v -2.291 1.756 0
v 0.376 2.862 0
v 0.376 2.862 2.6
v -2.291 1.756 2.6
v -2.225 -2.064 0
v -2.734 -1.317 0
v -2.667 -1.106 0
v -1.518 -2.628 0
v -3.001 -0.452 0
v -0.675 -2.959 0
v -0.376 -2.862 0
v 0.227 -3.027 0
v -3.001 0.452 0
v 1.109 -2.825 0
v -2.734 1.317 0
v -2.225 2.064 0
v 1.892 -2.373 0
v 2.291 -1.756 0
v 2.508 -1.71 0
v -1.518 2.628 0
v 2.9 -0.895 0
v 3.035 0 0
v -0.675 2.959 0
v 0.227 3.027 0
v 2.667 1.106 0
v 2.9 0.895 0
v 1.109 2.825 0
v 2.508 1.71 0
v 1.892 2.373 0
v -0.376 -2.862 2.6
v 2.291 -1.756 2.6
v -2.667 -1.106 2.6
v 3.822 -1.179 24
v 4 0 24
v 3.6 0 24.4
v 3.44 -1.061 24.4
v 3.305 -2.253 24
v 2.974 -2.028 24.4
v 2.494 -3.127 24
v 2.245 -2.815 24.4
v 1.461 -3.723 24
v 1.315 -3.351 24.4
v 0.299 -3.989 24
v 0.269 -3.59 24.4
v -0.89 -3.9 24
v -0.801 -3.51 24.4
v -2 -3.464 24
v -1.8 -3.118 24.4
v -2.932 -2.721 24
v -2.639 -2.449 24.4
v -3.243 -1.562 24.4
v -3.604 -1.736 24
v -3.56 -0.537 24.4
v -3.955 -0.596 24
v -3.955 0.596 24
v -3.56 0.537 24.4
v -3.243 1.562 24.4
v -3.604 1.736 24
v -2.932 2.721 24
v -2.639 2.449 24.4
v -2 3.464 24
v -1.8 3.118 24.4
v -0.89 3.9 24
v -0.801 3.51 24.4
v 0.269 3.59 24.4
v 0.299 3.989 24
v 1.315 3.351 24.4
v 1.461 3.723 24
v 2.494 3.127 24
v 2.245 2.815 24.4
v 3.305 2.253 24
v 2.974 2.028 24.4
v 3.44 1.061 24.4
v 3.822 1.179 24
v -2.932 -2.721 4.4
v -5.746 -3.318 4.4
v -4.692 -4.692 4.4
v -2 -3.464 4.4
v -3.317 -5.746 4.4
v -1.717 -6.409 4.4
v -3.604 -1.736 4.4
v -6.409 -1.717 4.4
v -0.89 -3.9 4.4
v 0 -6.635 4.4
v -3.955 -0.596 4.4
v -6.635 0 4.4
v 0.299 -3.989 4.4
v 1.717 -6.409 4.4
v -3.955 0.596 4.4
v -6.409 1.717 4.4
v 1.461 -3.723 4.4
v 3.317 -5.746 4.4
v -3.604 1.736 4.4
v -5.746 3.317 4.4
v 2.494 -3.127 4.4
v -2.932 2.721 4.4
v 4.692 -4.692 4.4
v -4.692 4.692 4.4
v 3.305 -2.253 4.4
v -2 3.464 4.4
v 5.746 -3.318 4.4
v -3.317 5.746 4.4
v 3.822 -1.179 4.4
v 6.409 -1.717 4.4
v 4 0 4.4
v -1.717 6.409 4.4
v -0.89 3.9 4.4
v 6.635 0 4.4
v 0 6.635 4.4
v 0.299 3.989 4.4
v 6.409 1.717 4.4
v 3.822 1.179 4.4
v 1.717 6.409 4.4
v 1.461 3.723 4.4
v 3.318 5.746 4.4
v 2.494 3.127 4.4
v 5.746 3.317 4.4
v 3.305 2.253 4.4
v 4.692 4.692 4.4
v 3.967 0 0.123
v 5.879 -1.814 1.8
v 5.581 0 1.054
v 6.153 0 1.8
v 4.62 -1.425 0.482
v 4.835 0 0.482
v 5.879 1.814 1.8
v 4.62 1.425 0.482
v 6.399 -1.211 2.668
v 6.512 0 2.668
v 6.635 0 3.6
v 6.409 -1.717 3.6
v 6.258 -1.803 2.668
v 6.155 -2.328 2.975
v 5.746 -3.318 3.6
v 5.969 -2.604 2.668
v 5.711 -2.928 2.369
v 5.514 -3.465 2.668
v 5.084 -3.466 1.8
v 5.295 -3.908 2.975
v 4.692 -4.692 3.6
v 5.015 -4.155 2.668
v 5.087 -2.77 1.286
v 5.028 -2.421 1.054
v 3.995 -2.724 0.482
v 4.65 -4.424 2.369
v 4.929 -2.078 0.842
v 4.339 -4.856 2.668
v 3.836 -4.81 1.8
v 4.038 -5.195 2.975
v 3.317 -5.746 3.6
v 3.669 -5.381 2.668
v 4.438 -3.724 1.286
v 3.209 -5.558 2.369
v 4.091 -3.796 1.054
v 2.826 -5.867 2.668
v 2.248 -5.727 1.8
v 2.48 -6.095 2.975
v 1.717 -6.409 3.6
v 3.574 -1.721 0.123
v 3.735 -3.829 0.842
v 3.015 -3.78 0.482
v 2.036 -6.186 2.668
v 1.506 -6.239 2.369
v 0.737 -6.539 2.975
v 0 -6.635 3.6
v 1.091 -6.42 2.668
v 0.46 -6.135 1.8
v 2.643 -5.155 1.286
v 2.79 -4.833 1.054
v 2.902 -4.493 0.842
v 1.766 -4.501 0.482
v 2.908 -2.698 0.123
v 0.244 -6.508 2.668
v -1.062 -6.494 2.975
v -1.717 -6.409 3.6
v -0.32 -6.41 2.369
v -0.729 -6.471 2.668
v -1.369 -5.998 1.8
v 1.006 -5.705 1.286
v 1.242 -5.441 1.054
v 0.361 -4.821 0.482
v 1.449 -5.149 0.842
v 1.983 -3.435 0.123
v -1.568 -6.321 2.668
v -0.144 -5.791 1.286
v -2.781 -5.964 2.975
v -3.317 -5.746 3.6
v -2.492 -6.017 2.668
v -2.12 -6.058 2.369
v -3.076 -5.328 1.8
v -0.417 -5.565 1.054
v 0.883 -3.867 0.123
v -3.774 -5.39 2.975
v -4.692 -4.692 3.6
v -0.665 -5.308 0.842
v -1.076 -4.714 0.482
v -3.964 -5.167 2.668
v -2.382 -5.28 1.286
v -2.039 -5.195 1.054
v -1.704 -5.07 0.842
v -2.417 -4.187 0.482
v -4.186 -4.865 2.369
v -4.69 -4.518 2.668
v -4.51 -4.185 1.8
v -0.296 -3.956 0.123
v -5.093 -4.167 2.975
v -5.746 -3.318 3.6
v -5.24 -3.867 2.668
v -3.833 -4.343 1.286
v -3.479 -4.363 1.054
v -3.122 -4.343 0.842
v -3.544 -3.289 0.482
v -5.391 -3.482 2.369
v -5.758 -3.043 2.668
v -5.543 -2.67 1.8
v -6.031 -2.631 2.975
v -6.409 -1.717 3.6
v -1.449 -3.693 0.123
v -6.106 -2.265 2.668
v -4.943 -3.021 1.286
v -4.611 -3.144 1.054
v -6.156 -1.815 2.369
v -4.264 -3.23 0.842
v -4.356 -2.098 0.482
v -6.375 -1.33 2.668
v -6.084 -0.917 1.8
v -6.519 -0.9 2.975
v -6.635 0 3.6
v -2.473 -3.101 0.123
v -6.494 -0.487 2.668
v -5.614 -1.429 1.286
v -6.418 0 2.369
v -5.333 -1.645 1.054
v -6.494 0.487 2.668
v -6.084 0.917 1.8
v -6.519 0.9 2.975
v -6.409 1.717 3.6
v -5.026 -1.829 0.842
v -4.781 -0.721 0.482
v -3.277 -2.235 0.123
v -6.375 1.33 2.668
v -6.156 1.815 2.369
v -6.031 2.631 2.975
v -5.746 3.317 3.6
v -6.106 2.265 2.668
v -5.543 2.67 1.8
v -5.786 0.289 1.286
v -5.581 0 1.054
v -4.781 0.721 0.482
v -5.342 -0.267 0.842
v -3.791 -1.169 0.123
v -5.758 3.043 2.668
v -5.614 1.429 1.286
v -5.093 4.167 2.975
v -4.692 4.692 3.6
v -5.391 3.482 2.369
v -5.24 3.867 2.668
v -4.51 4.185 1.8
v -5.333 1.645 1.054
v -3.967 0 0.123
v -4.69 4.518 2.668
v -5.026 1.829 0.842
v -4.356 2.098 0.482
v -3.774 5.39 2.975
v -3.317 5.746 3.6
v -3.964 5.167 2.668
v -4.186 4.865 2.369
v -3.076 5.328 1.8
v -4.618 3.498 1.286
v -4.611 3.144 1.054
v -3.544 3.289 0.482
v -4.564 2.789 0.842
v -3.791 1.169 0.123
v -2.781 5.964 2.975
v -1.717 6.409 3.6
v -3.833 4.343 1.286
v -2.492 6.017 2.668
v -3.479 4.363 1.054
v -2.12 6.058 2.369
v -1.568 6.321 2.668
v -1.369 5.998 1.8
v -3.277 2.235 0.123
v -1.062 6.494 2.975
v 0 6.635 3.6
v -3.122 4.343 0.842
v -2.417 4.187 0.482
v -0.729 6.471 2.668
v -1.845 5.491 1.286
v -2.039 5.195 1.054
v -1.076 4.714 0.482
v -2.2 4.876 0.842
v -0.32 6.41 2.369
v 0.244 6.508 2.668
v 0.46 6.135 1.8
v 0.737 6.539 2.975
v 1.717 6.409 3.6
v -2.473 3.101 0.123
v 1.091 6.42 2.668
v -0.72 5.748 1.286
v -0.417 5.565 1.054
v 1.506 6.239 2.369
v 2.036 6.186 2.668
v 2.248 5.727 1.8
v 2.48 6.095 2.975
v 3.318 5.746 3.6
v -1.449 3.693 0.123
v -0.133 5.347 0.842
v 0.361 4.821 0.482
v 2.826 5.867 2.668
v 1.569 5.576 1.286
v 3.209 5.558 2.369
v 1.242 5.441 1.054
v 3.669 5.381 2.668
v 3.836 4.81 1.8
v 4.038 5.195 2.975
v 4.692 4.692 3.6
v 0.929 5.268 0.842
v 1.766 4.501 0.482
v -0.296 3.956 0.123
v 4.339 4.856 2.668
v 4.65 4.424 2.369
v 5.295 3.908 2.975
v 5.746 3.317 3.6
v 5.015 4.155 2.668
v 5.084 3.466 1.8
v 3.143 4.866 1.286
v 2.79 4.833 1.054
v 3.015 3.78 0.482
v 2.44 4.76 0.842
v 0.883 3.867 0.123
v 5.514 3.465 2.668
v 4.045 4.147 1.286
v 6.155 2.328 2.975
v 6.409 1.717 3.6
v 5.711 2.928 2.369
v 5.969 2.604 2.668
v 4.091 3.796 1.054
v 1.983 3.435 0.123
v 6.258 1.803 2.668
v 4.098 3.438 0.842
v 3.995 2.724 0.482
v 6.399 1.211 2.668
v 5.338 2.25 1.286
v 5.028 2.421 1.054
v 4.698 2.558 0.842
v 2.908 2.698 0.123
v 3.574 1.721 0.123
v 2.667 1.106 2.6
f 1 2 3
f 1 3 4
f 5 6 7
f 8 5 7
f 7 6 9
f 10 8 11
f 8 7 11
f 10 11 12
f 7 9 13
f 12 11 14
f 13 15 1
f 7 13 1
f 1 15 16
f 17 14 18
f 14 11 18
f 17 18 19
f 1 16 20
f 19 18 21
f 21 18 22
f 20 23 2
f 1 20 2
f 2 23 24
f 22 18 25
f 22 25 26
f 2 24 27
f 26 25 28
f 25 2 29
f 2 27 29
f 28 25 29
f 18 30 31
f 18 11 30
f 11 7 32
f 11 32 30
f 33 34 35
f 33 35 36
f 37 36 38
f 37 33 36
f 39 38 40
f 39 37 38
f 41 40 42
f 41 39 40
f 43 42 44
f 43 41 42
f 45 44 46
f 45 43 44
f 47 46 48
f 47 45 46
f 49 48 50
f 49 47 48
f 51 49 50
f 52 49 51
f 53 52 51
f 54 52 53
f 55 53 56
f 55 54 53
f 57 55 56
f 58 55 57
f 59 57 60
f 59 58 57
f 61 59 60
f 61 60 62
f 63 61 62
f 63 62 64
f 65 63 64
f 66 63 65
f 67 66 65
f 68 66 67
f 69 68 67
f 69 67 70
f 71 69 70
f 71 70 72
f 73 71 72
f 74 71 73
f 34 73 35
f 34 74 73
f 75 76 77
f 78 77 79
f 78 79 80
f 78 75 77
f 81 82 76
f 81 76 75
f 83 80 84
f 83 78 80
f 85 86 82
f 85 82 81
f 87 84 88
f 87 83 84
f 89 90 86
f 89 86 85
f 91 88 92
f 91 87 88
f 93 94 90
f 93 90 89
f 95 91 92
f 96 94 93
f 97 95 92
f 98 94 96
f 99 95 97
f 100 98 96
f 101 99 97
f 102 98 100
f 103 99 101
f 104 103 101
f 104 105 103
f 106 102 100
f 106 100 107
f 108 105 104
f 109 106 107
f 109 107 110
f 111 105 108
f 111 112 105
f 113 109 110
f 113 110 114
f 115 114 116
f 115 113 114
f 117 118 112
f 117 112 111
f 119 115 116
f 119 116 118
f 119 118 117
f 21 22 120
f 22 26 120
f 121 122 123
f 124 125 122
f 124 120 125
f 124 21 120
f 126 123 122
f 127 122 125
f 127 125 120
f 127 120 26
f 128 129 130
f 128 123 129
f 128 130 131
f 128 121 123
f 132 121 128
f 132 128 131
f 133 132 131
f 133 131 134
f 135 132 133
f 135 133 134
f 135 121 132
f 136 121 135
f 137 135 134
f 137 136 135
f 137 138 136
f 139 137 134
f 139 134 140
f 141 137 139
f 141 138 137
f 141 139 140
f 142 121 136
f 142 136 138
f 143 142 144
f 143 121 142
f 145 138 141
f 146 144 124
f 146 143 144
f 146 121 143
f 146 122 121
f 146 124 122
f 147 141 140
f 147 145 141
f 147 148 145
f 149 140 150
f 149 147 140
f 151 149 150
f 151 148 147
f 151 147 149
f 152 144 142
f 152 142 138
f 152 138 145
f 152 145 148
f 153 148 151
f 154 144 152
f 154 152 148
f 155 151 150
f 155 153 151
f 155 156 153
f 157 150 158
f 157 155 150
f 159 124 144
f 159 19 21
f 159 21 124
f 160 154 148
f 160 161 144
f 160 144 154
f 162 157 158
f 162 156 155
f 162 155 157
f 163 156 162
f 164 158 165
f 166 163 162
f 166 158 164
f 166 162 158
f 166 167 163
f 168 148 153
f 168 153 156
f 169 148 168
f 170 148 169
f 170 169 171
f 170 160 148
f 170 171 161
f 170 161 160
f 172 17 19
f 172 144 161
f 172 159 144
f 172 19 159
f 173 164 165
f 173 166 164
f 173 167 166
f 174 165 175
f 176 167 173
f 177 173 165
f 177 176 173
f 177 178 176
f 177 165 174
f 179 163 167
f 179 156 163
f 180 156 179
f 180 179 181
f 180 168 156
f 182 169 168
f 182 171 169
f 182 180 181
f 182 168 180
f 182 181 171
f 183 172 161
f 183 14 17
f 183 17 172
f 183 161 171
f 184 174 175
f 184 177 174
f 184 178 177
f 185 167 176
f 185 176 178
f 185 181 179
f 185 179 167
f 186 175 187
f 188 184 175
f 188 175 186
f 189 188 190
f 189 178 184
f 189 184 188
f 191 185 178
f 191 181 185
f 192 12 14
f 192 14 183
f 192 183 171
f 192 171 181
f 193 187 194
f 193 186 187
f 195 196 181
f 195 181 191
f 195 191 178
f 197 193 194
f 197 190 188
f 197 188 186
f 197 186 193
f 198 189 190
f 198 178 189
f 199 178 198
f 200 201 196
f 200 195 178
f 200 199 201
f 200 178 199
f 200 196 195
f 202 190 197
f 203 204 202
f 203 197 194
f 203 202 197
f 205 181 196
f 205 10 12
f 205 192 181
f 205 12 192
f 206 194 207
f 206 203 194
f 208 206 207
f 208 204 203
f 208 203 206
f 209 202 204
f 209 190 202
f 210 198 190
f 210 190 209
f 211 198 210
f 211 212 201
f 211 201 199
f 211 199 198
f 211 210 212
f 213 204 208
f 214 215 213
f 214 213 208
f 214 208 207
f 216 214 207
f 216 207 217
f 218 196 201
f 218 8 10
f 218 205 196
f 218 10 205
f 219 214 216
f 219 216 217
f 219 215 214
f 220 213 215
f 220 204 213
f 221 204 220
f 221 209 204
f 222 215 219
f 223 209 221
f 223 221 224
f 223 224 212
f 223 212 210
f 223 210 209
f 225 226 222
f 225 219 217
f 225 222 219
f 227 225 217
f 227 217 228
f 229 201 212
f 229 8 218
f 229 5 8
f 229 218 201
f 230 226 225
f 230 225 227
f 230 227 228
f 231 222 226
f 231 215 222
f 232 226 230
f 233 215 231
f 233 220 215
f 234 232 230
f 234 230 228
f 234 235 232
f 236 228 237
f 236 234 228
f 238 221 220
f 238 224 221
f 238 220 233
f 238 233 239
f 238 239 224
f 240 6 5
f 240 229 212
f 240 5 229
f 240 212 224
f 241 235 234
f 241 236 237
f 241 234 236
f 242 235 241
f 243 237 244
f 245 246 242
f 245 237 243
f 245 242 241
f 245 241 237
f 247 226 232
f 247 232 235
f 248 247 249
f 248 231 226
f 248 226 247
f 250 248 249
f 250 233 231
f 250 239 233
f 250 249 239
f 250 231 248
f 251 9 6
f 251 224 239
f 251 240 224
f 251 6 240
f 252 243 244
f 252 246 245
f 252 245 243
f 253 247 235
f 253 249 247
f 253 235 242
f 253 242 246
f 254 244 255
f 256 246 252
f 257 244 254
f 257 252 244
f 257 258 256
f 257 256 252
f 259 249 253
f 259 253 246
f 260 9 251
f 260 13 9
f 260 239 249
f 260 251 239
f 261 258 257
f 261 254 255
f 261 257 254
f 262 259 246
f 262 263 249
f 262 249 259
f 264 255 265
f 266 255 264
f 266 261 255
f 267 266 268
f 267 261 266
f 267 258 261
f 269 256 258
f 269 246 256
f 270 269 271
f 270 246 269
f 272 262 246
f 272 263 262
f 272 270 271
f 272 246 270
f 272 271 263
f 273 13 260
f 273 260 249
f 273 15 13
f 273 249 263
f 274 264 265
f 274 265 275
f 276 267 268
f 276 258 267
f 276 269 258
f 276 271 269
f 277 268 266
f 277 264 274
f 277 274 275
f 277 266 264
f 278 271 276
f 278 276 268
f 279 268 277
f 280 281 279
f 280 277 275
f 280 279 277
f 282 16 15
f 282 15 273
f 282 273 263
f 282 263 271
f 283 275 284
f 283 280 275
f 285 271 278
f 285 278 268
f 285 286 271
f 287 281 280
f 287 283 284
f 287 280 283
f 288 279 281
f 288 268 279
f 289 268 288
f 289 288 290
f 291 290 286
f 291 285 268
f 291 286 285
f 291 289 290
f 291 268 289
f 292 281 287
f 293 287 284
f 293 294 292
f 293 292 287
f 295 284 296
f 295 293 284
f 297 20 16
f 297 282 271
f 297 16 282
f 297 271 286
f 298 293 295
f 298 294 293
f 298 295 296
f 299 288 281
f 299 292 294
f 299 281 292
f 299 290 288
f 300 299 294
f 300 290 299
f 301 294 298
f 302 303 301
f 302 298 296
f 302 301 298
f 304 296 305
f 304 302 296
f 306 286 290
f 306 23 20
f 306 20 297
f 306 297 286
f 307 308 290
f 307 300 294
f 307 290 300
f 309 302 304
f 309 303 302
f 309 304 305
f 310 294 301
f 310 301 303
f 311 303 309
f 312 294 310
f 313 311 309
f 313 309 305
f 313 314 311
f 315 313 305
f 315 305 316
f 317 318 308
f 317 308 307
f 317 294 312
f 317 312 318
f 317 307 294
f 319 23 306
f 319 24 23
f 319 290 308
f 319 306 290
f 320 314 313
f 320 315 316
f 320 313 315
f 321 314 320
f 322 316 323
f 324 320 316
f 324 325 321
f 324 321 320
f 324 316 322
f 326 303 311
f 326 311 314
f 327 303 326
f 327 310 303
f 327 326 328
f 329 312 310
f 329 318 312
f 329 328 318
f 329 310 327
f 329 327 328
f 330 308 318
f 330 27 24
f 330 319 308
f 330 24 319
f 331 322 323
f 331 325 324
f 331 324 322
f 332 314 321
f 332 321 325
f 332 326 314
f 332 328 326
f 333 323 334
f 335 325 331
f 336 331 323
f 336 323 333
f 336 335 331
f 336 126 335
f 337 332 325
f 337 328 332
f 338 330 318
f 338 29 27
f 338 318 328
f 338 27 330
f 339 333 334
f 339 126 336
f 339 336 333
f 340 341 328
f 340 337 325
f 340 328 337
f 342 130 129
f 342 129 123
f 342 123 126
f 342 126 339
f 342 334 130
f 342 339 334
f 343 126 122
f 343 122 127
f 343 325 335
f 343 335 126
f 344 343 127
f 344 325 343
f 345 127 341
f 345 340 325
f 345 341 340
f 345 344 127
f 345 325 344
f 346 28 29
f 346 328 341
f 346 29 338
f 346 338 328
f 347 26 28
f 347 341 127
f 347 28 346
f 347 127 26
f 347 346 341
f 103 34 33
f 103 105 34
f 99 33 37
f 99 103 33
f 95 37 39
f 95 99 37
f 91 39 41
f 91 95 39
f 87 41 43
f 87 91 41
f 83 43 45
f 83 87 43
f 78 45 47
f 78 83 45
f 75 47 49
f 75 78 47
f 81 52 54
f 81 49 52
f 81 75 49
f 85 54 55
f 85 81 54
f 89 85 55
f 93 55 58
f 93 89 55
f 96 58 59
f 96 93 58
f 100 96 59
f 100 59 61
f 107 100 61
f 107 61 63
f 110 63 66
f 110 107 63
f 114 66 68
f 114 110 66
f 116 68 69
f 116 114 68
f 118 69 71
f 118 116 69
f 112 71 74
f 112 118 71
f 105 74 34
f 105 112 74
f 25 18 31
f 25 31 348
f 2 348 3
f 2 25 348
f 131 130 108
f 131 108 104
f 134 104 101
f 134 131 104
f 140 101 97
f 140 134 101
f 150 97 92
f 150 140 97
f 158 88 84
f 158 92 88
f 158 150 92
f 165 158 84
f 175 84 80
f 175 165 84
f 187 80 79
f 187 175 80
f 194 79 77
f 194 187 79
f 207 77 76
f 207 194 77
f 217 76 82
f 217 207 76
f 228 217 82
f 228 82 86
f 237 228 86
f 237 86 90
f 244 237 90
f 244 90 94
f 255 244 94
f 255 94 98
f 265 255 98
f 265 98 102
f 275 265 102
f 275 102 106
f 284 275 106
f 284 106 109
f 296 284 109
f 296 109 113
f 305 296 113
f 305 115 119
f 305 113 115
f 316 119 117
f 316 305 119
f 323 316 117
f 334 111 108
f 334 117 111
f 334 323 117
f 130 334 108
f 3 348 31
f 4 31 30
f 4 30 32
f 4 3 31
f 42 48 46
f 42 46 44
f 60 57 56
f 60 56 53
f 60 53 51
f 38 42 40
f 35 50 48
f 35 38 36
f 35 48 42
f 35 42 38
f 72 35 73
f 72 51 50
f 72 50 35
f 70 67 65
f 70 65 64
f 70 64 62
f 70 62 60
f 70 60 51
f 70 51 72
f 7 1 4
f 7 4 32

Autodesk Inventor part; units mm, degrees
ref_plane "YZ Plane" through (0, 0, 0) normal (1, 0, 0) x (0, 1, 0)
ref_plane "XZ Plane" through (0, 0, 0) normal (0, 1, 0) x (-1, 0, 0)
ref_plane "XY Plane" through (0, 0, 0) normal (0, 0, 1) x (1, 0, 0)
sketch "Sketch1" plane through (0, 0, 0) normal (0, 0, 1) x (1, 0, 0)
  circle A0 centre (0, 0) radius 6.635
  circle A1 centre (0, 0) radius 4
  dimension "d0" = 13.27
  dimension "d1" = 8
extrude "Extrusion1" add sketch "Sketch1" along normal blind 4.4
extrude "Extrusion2" add sketch "Sketch1" along normal blind 24.4 contours A1
sketch "Boceto2" plane through (0, 0, 0) normal (0, 0, -1) x (-1, 0, 0)
  line L0 (2.2909, 1.7564) -> (2.6666, -1.1058)
  line L1 (2.6666, -1.1058) -> (0.3756, -2.8622)
  line L2 (0.3756, -2.8622) -> (-2.2909, -1.7564)
  line L3 (-2.2909, -1.7564) -> (-2.6666, 1.1058)
  line L4 (-2.6666, 1.1058) -> (-0.3756, 2.8622)
  line L5 (-0.3756, 2.8622) -> (2.2909, 1.7564)
  point P0 (0, 0)
  point P1 (0, 0)
  dimension "d6" = 5
extrude "Extrusión3" cut sketch "Boceto2" against normal blind 2.6
thread "Rosca1" size "M8x1.25" class "6g" standard "ISO Metric profile" length 430
fillet "Empalme1" radius 3.6 1 edges at (-6.635, 0, 0)
chamfer "Chaflán2" distance 0.4 angle 45 1 edges at (-4, 0, 24.4)
properties part number "Tornillo allen cabeza boton M8x20mm"
